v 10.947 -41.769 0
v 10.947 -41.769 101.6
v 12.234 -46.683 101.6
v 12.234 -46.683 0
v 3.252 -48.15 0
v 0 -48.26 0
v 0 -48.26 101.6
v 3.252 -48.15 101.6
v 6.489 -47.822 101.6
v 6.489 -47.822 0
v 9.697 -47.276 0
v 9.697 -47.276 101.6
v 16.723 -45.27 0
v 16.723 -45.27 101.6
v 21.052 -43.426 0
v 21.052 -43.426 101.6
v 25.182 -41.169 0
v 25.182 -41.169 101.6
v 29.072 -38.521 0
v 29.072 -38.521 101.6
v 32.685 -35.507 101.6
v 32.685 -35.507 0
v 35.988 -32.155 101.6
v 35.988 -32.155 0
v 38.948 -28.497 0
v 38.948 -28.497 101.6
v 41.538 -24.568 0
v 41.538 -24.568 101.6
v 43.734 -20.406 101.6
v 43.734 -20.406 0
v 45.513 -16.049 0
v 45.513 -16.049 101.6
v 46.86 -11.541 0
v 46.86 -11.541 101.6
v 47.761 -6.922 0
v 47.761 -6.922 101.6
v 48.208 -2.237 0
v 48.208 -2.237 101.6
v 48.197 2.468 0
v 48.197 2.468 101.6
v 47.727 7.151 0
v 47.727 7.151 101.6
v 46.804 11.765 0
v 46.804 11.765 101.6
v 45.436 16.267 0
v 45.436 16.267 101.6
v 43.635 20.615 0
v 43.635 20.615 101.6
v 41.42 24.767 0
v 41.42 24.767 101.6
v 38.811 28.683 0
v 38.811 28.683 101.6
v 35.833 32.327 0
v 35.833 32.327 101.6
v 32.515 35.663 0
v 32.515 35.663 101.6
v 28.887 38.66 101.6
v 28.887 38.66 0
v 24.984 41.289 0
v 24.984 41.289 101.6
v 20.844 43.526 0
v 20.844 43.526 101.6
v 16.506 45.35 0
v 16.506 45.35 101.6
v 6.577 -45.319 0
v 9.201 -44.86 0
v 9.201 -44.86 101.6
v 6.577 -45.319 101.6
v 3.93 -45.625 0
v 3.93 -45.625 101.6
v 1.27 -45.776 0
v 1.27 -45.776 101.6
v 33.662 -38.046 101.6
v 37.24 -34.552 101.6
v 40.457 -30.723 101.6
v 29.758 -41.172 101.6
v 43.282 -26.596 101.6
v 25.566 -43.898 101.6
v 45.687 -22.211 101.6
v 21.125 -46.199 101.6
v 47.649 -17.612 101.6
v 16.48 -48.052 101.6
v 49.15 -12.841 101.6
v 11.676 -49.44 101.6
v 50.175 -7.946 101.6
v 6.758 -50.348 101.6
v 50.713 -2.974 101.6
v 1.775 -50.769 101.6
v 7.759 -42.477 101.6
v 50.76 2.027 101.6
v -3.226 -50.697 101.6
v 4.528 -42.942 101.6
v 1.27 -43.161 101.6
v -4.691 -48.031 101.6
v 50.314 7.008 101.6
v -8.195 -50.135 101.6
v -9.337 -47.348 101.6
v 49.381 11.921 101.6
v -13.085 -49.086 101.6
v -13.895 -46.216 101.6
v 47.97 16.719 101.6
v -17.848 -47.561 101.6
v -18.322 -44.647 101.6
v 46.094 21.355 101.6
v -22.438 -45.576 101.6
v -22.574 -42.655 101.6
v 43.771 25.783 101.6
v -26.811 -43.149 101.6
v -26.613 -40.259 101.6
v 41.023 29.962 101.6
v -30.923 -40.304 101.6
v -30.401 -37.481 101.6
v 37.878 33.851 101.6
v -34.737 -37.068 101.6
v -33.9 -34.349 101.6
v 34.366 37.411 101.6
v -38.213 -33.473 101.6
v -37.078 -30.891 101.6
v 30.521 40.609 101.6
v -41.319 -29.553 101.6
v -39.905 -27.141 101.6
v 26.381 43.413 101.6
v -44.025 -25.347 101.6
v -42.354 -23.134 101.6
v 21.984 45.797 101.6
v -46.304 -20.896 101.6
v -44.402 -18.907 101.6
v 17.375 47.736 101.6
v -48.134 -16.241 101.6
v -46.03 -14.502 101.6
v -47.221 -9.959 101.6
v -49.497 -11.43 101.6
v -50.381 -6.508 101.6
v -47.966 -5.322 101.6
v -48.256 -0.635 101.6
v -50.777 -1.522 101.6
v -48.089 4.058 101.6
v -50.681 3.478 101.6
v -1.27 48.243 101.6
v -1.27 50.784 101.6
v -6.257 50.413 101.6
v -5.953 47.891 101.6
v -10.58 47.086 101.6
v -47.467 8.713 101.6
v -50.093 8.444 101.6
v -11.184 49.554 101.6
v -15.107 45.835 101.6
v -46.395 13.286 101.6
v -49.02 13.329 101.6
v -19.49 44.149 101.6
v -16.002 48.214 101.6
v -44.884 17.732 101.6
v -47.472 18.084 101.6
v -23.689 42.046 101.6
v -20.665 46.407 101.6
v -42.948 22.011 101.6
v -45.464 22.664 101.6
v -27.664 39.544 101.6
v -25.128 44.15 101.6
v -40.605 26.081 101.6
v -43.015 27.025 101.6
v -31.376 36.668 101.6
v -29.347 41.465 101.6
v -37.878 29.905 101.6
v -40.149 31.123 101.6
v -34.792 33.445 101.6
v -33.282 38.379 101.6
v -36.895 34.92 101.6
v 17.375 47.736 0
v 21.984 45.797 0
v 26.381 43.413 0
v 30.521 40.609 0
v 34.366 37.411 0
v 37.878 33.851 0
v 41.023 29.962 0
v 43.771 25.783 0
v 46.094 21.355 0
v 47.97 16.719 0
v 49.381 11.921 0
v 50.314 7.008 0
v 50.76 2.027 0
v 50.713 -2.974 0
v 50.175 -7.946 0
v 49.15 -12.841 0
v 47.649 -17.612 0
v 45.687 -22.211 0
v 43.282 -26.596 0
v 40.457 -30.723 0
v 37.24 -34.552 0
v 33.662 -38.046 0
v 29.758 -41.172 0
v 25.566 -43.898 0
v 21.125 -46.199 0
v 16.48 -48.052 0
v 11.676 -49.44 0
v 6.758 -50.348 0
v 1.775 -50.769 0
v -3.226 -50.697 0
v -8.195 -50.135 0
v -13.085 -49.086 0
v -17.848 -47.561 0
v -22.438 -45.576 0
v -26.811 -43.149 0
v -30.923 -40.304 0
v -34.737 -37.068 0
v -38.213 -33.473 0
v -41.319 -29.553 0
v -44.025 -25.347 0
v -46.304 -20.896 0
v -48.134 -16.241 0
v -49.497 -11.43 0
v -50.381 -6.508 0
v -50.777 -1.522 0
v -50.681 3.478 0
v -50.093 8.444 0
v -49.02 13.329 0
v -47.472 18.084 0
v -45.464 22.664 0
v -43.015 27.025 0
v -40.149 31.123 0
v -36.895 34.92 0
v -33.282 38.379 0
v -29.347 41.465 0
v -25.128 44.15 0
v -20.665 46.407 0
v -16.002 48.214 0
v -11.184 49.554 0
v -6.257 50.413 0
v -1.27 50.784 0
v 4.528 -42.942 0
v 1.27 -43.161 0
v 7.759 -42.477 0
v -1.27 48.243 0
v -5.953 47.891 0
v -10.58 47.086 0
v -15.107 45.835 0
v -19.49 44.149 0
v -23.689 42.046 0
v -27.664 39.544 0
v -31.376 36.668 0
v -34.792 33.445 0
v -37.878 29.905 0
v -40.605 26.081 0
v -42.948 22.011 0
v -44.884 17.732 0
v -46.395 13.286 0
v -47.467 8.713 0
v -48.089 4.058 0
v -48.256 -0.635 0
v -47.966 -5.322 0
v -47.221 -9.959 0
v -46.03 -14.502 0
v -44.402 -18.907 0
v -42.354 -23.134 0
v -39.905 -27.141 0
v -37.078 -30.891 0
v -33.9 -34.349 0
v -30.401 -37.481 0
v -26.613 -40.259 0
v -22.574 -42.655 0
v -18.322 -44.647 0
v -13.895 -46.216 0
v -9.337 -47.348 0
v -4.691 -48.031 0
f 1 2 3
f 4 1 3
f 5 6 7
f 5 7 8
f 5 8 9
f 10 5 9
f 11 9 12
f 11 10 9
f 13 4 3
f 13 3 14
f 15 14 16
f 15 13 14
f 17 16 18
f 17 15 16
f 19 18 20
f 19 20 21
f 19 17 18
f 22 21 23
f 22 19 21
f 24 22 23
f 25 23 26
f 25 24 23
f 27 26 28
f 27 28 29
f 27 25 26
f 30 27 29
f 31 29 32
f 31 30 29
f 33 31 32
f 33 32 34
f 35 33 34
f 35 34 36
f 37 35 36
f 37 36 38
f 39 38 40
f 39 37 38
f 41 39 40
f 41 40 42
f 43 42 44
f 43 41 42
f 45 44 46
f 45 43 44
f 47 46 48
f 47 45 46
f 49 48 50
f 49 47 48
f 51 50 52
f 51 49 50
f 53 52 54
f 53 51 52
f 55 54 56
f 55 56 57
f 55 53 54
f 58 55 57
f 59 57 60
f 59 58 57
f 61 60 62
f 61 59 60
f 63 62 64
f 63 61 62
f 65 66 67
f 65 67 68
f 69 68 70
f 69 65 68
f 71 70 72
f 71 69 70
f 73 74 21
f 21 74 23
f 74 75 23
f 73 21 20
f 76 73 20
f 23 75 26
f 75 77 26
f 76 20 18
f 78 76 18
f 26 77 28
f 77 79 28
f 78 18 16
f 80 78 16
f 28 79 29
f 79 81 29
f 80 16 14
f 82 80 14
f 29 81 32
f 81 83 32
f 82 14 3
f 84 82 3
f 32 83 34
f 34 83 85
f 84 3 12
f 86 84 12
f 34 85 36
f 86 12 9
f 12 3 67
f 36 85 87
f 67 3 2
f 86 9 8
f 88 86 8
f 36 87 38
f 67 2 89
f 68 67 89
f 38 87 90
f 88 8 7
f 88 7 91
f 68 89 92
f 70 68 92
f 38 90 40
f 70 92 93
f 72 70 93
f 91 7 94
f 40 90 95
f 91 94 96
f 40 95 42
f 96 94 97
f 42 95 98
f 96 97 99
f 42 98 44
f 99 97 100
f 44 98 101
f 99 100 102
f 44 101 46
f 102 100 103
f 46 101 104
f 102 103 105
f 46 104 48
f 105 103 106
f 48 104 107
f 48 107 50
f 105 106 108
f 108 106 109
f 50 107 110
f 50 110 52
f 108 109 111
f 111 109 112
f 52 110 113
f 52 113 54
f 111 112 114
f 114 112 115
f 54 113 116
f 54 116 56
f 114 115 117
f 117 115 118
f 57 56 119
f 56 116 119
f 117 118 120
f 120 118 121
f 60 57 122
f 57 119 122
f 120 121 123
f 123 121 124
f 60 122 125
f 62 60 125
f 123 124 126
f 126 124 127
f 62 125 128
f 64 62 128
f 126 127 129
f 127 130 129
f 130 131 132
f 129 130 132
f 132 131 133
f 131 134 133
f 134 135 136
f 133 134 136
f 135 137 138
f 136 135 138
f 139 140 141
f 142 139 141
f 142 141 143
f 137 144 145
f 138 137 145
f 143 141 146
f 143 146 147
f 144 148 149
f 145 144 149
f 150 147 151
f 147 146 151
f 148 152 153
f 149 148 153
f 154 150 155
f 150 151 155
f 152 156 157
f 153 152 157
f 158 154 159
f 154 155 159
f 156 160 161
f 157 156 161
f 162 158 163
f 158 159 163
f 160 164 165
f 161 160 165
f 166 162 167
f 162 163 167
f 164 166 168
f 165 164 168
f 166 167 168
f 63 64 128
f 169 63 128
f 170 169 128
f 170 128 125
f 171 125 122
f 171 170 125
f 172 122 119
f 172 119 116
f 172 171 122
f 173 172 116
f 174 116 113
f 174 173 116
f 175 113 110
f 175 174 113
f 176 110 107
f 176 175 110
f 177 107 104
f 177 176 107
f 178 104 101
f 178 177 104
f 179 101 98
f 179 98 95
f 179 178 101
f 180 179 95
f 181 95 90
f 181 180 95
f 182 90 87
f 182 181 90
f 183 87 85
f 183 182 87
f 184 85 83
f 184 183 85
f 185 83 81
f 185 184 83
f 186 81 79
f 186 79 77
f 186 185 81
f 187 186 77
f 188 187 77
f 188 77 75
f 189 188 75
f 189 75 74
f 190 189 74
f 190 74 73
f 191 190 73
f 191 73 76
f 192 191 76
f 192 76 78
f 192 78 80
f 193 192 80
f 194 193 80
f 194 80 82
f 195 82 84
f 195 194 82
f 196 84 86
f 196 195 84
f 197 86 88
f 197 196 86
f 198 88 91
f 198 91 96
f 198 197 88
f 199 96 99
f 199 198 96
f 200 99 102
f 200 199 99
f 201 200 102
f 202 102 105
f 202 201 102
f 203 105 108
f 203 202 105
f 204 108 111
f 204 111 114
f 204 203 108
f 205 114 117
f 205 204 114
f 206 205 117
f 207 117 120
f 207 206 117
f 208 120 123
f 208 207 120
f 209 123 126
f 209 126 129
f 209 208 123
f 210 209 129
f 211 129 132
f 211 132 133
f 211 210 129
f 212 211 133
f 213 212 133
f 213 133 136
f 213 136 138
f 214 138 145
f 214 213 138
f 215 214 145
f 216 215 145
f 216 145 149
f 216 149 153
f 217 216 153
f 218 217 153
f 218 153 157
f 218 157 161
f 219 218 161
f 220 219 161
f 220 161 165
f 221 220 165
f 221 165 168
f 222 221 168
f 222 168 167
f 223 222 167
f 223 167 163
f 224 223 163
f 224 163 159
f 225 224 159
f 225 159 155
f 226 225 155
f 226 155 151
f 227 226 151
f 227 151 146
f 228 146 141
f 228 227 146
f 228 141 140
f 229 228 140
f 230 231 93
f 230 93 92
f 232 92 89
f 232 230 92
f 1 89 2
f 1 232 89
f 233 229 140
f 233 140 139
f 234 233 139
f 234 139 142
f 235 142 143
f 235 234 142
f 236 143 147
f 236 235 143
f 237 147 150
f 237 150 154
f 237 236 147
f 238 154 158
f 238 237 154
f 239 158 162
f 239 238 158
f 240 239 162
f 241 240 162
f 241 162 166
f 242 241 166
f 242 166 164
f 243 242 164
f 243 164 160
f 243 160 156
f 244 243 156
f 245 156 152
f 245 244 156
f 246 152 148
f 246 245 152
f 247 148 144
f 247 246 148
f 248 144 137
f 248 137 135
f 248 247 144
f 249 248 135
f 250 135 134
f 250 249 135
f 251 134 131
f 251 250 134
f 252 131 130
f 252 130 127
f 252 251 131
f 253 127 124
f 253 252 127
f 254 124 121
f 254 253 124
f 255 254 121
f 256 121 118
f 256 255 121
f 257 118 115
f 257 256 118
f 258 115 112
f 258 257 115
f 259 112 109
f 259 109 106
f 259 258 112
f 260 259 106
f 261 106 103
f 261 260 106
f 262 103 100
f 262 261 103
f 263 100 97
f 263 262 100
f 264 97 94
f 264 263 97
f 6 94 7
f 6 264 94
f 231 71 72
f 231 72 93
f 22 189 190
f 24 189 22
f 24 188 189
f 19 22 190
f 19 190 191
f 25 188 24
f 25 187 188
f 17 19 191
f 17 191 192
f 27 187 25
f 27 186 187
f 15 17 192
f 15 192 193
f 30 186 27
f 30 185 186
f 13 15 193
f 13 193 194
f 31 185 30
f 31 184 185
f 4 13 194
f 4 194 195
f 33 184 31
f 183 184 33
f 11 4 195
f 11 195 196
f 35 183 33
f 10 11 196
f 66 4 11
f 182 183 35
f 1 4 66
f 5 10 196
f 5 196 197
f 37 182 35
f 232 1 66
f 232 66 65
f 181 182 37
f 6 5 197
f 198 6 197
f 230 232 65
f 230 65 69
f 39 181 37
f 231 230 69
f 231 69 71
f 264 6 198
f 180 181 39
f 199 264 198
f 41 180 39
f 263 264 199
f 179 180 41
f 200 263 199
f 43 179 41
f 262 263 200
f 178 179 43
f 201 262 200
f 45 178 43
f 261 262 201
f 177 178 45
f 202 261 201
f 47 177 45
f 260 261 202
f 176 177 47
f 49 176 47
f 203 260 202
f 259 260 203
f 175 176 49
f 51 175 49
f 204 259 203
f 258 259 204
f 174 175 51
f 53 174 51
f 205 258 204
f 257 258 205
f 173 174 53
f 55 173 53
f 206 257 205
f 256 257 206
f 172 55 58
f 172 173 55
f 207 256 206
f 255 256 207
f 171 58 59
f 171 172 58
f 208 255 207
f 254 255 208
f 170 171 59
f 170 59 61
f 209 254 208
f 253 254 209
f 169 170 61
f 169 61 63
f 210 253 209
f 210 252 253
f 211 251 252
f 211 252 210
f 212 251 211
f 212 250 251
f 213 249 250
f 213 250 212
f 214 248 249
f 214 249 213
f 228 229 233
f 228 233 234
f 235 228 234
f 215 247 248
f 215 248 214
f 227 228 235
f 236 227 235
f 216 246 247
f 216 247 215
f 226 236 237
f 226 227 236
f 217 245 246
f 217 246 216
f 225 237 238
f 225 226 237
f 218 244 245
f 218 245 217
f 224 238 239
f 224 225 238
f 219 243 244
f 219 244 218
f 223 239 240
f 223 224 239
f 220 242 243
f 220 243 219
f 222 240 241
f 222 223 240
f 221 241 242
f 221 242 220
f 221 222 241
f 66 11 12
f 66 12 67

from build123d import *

# Parameters (mm, degrees)
BOSS_EXTRUDE1_DEPTH = 101.6


with BuildPart() as part:
    # Sketch1 → Boss-Extrude1 (new body)
    with BuildSketch(Plane.XY):
        with BuildLine():
            Line((-1.27, 50.784122519), (-1.27, 48.24328658))
            ThreePointArc((-1.27, 48.24328658), (-48.255821464, -0.635054985), (0, -48.26))
            ThreePointArc((0, -48.26), (4.873264732, -48.013319932), (9.696710265, -47.275801527))
            Line((9.696710265, -47.275801527), (9.201166175, -44.859802346))
            ThreePointArc((9.201166175, -44.859802346), (5.255589984, -45.491121106), (1.27, -45.776090108))
            Line((1.27, -45.776090108), (1.27, -43.161319489))
            ThreePointArc((1.27, -43.161319489), (6.147836333, -42.740104216), (10.946634308, -41.769409827))
            Line((10.946634308, -41.769409827), (12.234473638, -46.683458042))
            ThreePointArc((12.234473638, -46.683458042), (48.208106465, -2.237425089), (16.505892117, 45.349565879))
            Line((16.505892117, 45.349565879), (17.374623281, 47.736385136))
            ThreePointArc((17.374623281, 47.736385136), (-8.195236332, -50.134599843), (-1.27, 50.784122519))
        make_face()
    extrude(amount=BOSS_EXTRUDE1_DEPTH)


solid = part.part
